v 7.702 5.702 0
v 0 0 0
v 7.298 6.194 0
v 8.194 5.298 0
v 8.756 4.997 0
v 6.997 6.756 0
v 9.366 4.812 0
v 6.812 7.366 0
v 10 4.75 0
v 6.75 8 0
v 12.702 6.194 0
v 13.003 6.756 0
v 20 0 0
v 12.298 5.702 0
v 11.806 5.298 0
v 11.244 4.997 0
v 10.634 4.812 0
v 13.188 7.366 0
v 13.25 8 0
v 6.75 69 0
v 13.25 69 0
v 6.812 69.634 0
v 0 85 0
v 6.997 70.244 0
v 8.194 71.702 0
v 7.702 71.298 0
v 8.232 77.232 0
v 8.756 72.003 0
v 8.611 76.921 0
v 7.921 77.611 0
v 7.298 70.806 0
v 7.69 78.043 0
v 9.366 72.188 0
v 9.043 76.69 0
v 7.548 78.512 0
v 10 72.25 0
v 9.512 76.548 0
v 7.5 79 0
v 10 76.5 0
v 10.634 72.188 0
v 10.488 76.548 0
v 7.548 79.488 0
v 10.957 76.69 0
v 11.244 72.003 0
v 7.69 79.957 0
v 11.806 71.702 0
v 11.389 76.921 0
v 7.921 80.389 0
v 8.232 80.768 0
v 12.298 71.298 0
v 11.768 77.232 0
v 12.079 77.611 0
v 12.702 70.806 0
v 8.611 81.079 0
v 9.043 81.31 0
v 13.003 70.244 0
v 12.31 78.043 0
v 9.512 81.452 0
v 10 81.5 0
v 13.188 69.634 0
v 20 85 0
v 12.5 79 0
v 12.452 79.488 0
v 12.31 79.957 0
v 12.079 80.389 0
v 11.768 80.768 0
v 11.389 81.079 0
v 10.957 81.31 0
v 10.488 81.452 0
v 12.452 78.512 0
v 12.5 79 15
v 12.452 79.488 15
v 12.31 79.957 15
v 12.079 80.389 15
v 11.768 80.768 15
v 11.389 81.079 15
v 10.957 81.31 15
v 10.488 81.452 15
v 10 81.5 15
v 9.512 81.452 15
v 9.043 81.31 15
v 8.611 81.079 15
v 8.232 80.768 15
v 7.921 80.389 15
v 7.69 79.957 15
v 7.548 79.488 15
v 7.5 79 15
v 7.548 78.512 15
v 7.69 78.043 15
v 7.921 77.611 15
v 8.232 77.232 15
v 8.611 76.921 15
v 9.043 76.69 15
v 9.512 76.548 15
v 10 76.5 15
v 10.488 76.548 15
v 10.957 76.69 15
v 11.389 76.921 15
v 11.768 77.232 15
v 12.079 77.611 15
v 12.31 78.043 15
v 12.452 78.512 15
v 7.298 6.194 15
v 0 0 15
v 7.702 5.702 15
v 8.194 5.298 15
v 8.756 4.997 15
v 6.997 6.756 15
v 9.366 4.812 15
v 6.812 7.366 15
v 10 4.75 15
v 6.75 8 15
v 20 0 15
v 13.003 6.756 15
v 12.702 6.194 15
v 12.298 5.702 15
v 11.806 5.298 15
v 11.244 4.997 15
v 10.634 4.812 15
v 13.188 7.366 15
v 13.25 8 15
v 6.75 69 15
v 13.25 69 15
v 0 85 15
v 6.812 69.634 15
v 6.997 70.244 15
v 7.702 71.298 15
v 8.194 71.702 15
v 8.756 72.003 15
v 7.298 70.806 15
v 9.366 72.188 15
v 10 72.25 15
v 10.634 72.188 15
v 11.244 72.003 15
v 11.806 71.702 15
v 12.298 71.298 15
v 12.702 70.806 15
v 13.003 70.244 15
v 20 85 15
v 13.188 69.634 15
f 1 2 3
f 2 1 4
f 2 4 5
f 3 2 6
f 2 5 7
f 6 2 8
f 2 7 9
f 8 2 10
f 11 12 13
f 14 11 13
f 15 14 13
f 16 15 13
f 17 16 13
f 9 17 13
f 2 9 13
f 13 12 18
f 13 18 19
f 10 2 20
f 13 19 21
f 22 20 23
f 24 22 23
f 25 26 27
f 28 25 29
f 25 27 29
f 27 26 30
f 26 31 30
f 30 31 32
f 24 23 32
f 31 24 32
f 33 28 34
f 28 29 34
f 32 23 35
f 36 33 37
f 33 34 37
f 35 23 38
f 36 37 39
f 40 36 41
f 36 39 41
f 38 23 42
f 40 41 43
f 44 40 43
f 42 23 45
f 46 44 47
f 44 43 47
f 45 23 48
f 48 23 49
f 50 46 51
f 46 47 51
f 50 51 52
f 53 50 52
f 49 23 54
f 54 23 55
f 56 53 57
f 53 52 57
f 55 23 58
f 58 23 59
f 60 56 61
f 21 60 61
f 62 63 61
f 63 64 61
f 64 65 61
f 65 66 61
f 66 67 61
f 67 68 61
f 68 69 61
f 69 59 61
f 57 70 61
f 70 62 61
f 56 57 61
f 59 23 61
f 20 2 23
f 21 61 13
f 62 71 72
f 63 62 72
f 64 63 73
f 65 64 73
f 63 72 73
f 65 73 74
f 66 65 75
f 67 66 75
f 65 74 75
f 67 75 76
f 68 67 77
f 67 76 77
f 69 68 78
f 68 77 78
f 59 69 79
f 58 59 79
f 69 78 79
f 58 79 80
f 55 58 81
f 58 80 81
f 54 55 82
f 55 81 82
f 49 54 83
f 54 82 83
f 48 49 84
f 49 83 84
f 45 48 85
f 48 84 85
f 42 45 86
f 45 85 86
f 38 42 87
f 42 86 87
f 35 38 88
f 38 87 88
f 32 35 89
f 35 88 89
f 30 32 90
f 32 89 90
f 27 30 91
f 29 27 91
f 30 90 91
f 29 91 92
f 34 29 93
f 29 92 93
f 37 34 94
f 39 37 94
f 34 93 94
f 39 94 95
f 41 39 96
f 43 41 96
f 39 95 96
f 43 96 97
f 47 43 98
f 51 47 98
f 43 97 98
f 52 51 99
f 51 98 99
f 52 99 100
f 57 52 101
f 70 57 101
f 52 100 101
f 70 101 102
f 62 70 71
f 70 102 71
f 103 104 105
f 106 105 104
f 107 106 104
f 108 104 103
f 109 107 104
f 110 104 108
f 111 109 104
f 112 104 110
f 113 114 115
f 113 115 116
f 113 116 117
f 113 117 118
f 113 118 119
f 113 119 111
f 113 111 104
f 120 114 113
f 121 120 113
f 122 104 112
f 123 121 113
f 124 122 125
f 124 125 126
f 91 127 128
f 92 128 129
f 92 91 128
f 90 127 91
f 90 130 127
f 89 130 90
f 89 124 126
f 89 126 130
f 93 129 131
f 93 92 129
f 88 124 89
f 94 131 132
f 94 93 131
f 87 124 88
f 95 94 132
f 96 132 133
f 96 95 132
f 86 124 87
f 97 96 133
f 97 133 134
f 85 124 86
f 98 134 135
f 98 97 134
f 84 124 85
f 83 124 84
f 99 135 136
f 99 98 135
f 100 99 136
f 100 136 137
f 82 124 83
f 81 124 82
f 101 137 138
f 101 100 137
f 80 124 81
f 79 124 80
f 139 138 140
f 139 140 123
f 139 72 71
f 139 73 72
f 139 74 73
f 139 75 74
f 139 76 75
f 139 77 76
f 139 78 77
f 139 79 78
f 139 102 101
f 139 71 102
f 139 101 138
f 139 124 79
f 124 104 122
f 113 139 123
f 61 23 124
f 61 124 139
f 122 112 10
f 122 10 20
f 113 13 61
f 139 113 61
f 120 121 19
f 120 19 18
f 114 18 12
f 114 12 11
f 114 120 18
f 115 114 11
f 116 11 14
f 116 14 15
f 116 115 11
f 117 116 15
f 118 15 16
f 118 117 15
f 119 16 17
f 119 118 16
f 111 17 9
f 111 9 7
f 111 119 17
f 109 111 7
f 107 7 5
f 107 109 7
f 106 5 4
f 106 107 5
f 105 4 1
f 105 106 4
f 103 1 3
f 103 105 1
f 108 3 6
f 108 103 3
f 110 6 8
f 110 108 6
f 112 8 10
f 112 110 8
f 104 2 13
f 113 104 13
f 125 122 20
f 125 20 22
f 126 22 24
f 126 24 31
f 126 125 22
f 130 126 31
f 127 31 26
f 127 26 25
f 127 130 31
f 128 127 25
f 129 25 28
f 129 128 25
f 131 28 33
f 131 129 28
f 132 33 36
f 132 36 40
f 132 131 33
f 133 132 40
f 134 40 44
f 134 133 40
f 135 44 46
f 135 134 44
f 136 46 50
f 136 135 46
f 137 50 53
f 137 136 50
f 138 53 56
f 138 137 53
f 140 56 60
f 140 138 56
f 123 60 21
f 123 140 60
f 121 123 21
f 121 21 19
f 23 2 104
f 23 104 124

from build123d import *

# Parameters (mm, degrees)
ESQUISSE1_W             = 20
ESQUISSE1_H             = 85
BOSS_EXTRU_1_DEPTH      = 15
ESQUISSE2_R             = 2.5
ENL_V_MAT_EXTRU_1_DEPTH = 15


with BuildPart() as part:
    # Esquisse1 → Boss.-Extru.1 (new body)
    with BuildSketch(Plane.XY):
        with Locations((10, 42.5)):
            Rectangle(ESQUISSE1_W, ESQUISSE1_H)
    extrude(amount=BOSS_EXTRU_1_DEPTH)

    # Esquisse2 → Enlèv. mat.-Extru.1 (cut)
    with BuildSketch(Plane.XY.offset(15)):
        with Locations((10, 79)):
            Circle(ESQUISSE2_R)
        with BuildLine():
            Line((6.75, 8), (6.75, 69))
            ThreePointArc((6.75, 69), (10, 72.25), (13.25, 69))
            Line((13.25, 69), (13.25, 8))
            ThreePointArc((13.25, 8), (10, 4.75), (6.75, 8))
        make_face()
    extrude(amount=-ENL_V_MAT_EXTRU_1_DEPTH, mode=Mode.SUBTRACT)


solid = part.part
